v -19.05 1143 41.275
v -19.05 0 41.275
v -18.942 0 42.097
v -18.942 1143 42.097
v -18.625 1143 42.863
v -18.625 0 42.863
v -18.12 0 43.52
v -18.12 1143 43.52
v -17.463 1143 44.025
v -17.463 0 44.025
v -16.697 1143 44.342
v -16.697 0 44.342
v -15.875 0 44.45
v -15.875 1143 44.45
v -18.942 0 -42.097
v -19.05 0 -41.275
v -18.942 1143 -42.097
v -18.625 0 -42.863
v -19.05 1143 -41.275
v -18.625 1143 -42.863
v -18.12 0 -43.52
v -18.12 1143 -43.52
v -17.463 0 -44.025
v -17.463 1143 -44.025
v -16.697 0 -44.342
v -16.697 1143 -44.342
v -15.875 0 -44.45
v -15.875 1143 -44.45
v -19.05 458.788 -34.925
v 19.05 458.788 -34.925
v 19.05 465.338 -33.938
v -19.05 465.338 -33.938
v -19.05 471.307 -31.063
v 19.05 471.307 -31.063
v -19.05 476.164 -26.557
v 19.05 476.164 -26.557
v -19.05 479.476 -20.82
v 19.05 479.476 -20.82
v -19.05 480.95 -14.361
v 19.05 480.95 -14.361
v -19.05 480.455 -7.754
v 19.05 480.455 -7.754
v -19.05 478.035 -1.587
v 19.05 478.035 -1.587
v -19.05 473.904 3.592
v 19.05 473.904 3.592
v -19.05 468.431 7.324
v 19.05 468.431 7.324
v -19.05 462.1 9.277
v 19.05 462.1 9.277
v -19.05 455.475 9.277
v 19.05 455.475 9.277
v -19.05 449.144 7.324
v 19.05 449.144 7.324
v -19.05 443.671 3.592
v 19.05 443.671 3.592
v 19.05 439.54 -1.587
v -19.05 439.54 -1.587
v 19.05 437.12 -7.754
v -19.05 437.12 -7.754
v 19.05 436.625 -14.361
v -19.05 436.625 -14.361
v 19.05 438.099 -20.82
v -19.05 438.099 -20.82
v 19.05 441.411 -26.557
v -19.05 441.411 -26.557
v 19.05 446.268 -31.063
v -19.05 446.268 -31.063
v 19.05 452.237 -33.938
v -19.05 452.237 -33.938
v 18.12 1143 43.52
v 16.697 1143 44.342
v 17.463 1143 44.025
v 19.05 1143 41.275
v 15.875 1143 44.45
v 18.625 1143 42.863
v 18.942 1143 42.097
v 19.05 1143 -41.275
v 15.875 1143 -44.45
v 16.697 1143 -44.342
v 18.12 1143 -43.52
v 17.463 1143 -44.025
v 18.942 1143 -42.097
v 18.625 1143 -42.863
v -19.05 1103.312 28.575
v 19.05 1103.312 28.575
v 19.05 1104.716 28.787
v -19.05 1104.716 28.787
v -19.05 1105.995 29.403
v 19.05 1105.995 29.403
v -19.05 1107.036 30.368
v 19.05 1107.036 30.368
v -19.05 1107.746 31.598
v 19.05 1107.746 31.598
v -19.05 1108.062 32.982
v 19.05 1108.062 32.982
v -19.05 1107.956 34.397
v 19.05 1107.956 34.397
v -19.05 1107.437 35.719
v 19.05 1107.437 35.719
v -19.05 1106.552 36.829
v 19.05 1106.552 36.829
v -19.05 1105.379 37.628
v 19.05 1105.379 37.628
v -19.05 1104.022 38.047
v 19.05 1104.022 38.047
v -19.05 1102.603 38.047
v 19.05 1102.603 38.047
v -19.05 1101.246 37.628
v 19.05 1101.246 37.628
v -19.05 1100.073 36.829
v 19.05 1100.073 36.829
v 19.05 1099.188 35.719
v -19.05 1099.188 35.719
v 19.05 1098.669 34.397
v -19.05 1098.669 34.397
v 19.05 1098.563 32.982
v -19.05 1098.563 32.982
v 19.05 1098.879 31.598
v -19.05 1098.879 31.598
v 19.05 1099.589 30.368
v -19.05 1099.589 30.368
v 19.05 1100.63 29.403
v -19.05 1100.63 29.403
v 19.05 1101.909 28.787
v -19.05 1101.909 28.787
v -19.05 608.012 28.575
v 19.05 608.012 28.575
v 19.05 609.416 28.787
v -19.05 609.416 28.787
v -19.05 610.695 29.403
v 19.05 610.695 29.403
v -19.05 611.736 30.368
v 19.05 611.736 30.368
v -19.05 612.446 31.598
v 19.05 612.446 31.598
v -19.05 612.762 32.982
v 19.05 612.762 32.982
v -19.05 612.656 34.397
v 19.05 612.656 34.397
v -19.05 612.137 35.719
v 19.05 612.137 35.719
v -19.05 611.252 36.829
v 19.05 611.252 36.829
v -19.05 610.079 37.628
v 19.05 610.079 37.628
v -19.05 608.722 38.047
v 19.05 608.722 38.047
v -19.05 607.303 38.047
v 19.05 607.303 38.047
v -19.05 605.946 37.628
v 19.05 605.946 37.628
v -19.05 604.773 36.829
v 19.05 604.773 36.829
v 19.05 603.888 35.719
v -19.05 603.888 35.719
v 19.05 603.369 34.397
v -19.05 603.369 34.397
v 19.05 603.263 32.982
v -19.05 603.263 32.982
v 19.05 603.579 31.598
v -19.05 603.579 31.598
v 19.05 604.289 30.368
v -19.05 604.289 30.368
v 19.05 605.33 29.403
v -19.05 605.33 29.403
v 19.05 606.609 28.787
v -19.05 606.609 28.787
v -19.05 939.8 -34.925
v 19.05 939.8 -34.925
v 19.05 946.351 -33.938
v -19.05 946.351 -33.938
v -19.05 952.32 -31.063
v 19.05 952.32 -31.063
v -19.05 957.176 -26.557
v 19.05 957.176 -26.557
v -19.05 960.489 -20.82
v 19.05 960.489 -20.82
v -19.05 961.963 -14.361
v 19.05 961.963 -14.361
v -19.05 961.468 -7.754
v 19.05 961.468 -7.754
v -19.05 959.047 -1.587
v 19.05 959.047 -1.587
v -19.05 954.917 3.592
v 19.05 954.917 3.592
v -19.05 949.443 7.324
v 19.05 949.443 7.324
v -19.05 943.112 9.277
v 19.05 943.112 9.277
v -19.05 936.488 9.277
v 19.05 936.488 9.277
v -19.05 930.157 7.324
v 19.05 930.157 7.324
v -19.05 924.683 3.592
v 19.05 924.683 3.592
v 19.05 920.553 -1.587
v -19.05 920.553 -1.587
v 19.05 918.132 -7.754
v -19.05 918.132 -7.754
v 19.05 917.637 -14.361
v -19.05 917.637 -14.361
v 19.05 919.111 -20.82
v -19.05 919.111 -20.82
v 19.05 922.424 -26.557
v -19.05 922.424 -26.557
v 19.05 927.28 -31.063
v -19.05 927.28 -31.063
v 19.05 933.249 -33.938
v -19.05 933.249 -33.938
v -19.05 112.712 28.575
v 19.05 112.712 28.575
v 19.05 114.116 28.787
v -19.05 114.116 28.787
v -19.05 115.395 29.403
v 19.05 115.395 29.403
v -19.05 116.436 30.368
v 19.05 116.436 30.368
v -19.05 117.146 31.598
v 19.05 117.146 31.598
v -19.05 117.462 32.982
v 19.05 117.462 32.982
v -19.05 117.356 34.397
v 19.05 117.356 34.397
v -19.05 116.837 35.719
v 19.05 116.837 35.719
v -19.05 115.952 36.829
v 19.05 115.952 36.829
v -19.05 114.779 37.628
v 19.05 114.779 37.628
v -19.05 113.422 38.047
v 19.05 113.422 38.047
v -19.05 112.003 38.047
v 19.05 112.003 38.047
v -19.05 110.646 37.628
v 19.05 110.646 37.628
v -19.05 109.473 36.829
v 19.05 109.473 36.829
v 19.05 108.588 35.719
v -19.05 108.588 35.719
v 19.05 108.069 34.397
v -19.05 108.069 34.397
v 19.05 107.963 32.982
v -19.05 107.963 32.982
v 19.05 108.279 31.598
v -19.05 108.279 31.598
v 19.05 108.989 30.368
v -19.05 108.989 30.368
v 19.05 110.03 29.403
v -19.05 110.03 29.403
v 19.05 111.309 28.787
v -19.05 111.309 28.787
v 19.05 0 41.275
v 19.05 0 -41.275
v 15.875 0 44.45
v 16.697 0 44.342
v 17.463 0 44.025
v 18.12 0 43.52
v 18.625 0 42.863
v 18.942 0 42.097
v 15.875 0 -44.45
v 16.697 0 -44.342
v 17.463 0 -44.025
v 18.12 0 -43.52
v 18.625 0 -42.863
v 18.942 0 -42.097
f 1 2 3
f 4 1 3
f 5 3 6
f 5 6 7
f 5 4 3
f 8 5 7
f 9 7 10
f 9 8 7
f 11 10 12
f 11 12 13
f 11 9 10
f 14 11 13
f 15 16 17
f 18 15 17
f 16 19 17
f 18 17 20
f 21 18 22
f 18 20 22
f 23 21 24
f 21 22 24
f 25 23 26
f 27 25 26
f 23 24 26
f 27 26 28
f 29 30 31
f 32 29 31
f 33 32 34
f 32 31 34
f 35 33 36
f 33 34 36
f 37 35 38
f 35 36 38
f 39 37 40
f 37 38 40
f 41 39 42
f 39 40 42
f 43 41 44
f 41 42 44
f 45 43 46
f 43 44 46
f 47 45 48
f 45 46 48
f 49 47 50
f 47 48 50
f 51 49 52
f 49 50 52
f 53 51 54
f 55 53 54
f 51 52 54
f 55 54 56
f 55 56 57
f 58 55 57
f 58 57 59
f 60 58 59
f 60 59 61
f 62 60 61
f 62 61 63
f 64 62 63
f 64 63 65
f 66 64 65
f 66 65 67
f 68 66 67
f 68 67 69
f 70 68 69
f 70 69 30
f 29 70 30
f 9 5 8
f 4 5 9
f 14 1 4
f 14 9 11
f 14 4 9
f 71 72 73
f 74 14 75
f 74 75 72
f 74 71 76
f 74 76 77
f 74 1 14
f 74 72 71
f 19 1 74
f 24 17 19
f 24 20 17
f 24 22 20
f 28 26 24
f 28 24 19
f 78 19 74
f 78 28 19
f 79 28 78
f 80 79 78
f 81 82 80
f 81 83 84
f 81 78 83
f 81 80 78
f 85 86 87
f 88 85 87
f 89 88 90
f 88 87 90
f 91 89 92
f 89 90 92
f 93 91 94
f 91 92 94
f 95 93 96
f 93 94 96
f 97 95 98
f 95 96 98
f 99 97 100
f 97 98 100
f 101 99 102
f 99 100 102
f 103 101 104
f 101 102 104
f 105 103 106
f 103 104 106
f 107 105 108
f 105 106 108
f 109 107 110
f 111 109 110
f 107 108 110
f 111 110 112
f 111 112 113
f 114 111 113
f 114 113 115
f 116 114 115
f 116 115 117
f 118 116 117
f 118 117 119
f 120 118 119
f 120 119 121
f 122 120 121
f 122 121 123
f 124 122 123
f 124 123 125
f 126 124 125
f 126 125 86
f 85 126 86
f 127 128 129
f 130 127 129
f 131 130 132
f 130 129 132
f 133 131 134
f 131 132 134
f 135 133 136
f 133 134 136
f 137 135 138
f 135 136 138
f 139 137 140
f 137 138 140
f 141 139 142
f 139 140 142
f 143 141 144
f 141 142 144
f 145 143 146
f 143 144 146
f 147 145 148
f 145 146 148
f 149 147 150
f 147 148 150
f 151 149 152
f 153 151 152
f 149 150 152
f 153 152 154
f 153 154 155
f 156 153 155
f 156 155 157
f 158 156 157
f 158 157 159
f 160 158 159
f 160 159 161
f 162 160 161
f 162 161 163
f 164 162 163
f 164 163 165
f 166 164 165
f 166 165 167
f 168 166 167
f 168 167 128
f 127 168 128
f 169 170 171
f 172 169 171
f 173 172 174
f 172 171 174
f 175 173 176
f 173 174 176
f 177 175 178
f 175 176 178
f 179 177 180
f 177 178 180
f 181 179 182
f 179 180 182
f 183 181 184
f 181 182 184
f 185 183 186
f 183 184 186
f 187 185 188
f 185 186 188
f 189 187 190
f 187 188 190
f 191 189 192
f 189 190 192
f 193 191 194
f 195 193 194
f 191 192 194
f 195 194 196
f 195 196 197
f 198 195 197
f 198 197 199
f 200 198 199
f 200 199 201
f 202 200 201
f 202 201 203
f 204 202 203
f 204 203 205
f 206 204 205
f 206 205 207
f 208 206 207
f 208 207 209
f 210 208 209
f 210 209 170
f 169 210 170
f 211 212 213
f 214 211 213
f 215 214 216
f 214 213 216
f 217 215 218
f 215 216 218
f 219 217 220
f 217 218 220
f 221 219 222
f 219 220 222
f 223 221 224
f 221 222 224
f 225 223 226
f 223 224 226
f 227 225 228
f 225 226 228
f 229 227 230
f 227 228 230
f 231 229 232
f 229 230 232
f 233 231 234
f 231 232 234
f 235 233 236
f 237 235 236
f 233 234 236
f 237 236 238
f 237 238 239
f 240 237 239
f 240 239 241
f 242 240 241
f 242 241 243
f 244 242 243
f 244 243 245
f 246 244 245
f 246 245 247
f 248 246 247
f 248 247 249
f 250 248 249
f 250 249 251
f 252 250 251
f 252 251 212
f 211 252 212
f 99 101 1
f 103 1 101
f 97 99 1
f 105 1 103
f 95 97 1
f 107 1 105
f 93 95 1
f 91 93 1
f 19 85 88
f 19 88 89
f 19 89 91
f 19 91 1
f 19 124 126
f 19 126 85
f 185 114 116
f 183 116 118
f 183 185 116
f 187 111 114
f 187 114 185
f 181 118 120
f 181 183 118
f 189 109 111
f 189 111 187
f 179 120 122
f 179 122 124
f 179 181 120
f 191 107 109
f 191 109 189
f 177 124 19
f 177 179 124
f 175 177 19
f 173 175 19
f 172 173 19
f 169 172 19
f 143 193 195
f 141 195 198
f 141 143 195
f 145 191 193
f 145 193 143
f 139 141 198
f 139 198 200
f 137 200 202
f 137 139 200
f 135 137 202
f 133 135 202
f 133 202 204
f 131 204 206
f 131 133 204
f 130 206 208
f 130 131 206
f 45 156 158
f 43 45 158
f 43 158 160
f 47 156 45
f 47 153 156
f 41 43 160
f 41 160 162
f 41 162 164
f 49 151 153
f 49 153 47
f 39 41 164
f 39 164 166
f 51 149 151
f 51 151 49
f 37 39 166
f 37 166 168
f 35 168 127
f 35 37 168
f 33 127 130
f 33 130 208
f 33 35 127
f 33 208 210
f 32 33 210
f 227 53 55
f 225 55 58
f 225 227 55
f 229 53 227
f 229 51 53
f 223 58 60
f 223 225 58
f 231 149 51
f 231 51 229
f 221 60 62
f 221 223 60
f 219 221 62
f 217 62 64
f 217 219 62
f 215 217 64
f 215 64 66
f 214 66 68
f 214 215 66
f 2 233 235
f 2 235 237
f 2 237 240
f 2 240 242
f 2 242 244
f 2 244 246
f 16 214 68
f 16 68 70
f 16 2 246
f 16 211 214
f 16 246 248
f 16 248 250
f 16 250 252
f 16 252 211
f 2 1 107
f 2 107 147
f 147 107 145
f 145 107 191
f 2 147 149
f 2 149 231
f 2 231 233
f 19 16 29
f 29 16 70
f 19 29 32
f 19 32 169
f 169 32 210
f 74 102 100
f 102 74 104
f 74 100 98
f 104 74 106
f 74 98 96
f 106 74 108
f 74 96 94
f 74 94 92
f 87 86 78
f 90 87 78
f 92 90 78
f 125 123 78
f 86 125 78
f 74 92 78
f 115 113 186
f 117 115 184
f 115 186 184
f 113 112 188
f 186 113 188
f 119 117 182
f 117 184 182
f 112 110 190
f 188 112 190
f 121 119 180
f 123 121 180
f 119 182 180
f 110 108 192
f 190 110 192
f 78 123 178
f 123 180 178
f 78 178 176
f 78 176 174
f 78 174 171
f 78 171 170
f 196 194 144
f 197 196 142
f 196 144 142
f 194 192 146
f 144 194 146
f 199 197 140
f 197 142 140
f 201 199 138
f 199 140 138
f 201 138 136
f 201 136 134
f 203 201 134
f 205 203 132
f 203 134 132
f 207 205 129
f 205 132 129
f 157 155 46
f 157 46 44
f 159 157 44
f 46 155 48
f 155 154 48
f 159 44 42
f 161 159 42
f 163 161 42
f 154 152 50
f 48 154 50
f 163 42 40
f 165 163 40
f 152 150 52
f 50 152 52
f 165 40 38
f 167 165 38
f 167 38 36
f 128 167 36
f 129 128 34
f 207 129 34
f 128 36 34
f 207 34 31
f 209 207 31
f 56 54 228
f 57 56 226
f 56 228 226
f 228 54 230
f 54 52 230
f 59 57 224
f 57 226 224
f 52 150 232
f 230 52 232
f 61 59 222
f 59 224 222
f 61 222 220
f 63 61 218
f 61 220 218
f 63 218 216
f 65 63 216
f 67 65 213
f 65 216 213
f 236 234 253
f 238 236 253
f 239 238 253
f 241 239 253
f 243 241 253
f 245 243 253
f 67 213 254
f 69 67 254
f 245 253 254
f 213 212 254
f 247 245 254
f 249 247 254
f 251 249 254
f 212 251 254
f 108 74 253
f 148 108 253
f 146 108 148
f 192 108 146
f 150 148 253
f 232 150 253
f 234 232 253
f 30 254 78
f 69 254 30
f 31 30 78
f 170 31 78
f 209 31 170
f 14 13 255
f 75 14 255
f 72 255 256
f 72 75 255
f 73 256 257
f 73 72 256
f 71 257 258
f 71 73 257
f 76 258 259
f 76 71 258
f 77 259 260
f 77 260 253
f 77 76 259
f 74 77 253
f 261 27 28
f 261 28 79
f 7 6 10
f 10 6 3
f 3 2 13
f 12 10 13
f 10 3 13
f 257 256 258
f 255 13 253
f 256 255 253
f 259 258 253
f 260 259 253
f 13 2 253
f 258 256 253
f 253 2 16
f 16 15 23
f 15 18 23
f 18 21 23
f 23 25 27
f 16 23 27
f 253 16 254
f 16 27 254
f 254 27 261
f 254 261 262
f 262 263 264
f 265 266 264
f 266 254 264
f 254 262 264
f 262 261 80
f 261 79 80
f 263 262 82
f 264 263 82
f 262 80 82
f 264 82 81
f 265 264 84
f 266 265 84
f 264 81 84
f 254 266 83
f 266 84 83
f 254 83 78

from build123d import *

# Parameters (mm, degrees)
SKETCH1_W           = 38.1
SKETCH1_H           = 88.9
BOSS_EXTRUDE1_DEPTH = 1143
SKETCH2_R           = 22.225
CUT_EXTRUDE4_DEPTH  = 918.6545
SKETCH3_R           = 4.7625
CUT_EXTRUDE5_DEPTH  = 1145.498323502
FILLET1_R           = 3.175


with BuildPart() as part:
    # Sketch1 → Boss-Extrude1 (new body)
    with BuildSketch(Plane(origin=(0, 0, 0), x_dir=(1, 0, 0), z_dir=(0, 1, 0))):
        Rectangle(SKETCH1_W, SKETCH1_H)
    extrude(amount=BOSS_EXTRUDE1_DEPTH)

    # Sketch2 → Cut-Extrude4 (cut)
    with BuildSketch(Plane(origin=(19.05, 0, 0), x_dir=(0, 0, -1), z_dir=(1, 0, 0))):
        with Locations((12.7, 458.7875)):
            Circle(SKETCH2_R)
        with Locations((12.7, 939.8)):
            Circle(SKETCH2_R)
    extrude(amount=-CUT_EXTRUDE4_DEPTH, mode=Mode.SUBTRACT)

    # Sketch3 → Cut-Extrude5 (cut, through all)
    with BuildSketch(Plane(origin=(19.05, 0, 0), x_dir=(0, 0, -1), z_dir=(1, 0, 0))):
        with Locations((-33.3375, 112.7125)):
            Circle(SKETCH3_R)
        with Locations((-33.3375, 608.0125)):
            Circle(SKETCH3_R)
        with Locations((-33.3375, 1103.3125)):
            Circle(SKETCH3_R)
    extrude(amount=-CUT_EXTRUDE5_DEPTH, mode=Mode.SUBTRACT)

    # Fillet1
    fillet1_edges = [part.edges().sort_by_distance(p)[0] for p in [
        (19.05, 571.5, 44.45),
        (-19.05, 571.5, 44.45),
        (-19.05, 571.5, -44.45),
        (19.05, 571.5, -44.45),
    ]]
    fillet(fillet1_edges, radius=FILLET1_R)


solid = part.part
